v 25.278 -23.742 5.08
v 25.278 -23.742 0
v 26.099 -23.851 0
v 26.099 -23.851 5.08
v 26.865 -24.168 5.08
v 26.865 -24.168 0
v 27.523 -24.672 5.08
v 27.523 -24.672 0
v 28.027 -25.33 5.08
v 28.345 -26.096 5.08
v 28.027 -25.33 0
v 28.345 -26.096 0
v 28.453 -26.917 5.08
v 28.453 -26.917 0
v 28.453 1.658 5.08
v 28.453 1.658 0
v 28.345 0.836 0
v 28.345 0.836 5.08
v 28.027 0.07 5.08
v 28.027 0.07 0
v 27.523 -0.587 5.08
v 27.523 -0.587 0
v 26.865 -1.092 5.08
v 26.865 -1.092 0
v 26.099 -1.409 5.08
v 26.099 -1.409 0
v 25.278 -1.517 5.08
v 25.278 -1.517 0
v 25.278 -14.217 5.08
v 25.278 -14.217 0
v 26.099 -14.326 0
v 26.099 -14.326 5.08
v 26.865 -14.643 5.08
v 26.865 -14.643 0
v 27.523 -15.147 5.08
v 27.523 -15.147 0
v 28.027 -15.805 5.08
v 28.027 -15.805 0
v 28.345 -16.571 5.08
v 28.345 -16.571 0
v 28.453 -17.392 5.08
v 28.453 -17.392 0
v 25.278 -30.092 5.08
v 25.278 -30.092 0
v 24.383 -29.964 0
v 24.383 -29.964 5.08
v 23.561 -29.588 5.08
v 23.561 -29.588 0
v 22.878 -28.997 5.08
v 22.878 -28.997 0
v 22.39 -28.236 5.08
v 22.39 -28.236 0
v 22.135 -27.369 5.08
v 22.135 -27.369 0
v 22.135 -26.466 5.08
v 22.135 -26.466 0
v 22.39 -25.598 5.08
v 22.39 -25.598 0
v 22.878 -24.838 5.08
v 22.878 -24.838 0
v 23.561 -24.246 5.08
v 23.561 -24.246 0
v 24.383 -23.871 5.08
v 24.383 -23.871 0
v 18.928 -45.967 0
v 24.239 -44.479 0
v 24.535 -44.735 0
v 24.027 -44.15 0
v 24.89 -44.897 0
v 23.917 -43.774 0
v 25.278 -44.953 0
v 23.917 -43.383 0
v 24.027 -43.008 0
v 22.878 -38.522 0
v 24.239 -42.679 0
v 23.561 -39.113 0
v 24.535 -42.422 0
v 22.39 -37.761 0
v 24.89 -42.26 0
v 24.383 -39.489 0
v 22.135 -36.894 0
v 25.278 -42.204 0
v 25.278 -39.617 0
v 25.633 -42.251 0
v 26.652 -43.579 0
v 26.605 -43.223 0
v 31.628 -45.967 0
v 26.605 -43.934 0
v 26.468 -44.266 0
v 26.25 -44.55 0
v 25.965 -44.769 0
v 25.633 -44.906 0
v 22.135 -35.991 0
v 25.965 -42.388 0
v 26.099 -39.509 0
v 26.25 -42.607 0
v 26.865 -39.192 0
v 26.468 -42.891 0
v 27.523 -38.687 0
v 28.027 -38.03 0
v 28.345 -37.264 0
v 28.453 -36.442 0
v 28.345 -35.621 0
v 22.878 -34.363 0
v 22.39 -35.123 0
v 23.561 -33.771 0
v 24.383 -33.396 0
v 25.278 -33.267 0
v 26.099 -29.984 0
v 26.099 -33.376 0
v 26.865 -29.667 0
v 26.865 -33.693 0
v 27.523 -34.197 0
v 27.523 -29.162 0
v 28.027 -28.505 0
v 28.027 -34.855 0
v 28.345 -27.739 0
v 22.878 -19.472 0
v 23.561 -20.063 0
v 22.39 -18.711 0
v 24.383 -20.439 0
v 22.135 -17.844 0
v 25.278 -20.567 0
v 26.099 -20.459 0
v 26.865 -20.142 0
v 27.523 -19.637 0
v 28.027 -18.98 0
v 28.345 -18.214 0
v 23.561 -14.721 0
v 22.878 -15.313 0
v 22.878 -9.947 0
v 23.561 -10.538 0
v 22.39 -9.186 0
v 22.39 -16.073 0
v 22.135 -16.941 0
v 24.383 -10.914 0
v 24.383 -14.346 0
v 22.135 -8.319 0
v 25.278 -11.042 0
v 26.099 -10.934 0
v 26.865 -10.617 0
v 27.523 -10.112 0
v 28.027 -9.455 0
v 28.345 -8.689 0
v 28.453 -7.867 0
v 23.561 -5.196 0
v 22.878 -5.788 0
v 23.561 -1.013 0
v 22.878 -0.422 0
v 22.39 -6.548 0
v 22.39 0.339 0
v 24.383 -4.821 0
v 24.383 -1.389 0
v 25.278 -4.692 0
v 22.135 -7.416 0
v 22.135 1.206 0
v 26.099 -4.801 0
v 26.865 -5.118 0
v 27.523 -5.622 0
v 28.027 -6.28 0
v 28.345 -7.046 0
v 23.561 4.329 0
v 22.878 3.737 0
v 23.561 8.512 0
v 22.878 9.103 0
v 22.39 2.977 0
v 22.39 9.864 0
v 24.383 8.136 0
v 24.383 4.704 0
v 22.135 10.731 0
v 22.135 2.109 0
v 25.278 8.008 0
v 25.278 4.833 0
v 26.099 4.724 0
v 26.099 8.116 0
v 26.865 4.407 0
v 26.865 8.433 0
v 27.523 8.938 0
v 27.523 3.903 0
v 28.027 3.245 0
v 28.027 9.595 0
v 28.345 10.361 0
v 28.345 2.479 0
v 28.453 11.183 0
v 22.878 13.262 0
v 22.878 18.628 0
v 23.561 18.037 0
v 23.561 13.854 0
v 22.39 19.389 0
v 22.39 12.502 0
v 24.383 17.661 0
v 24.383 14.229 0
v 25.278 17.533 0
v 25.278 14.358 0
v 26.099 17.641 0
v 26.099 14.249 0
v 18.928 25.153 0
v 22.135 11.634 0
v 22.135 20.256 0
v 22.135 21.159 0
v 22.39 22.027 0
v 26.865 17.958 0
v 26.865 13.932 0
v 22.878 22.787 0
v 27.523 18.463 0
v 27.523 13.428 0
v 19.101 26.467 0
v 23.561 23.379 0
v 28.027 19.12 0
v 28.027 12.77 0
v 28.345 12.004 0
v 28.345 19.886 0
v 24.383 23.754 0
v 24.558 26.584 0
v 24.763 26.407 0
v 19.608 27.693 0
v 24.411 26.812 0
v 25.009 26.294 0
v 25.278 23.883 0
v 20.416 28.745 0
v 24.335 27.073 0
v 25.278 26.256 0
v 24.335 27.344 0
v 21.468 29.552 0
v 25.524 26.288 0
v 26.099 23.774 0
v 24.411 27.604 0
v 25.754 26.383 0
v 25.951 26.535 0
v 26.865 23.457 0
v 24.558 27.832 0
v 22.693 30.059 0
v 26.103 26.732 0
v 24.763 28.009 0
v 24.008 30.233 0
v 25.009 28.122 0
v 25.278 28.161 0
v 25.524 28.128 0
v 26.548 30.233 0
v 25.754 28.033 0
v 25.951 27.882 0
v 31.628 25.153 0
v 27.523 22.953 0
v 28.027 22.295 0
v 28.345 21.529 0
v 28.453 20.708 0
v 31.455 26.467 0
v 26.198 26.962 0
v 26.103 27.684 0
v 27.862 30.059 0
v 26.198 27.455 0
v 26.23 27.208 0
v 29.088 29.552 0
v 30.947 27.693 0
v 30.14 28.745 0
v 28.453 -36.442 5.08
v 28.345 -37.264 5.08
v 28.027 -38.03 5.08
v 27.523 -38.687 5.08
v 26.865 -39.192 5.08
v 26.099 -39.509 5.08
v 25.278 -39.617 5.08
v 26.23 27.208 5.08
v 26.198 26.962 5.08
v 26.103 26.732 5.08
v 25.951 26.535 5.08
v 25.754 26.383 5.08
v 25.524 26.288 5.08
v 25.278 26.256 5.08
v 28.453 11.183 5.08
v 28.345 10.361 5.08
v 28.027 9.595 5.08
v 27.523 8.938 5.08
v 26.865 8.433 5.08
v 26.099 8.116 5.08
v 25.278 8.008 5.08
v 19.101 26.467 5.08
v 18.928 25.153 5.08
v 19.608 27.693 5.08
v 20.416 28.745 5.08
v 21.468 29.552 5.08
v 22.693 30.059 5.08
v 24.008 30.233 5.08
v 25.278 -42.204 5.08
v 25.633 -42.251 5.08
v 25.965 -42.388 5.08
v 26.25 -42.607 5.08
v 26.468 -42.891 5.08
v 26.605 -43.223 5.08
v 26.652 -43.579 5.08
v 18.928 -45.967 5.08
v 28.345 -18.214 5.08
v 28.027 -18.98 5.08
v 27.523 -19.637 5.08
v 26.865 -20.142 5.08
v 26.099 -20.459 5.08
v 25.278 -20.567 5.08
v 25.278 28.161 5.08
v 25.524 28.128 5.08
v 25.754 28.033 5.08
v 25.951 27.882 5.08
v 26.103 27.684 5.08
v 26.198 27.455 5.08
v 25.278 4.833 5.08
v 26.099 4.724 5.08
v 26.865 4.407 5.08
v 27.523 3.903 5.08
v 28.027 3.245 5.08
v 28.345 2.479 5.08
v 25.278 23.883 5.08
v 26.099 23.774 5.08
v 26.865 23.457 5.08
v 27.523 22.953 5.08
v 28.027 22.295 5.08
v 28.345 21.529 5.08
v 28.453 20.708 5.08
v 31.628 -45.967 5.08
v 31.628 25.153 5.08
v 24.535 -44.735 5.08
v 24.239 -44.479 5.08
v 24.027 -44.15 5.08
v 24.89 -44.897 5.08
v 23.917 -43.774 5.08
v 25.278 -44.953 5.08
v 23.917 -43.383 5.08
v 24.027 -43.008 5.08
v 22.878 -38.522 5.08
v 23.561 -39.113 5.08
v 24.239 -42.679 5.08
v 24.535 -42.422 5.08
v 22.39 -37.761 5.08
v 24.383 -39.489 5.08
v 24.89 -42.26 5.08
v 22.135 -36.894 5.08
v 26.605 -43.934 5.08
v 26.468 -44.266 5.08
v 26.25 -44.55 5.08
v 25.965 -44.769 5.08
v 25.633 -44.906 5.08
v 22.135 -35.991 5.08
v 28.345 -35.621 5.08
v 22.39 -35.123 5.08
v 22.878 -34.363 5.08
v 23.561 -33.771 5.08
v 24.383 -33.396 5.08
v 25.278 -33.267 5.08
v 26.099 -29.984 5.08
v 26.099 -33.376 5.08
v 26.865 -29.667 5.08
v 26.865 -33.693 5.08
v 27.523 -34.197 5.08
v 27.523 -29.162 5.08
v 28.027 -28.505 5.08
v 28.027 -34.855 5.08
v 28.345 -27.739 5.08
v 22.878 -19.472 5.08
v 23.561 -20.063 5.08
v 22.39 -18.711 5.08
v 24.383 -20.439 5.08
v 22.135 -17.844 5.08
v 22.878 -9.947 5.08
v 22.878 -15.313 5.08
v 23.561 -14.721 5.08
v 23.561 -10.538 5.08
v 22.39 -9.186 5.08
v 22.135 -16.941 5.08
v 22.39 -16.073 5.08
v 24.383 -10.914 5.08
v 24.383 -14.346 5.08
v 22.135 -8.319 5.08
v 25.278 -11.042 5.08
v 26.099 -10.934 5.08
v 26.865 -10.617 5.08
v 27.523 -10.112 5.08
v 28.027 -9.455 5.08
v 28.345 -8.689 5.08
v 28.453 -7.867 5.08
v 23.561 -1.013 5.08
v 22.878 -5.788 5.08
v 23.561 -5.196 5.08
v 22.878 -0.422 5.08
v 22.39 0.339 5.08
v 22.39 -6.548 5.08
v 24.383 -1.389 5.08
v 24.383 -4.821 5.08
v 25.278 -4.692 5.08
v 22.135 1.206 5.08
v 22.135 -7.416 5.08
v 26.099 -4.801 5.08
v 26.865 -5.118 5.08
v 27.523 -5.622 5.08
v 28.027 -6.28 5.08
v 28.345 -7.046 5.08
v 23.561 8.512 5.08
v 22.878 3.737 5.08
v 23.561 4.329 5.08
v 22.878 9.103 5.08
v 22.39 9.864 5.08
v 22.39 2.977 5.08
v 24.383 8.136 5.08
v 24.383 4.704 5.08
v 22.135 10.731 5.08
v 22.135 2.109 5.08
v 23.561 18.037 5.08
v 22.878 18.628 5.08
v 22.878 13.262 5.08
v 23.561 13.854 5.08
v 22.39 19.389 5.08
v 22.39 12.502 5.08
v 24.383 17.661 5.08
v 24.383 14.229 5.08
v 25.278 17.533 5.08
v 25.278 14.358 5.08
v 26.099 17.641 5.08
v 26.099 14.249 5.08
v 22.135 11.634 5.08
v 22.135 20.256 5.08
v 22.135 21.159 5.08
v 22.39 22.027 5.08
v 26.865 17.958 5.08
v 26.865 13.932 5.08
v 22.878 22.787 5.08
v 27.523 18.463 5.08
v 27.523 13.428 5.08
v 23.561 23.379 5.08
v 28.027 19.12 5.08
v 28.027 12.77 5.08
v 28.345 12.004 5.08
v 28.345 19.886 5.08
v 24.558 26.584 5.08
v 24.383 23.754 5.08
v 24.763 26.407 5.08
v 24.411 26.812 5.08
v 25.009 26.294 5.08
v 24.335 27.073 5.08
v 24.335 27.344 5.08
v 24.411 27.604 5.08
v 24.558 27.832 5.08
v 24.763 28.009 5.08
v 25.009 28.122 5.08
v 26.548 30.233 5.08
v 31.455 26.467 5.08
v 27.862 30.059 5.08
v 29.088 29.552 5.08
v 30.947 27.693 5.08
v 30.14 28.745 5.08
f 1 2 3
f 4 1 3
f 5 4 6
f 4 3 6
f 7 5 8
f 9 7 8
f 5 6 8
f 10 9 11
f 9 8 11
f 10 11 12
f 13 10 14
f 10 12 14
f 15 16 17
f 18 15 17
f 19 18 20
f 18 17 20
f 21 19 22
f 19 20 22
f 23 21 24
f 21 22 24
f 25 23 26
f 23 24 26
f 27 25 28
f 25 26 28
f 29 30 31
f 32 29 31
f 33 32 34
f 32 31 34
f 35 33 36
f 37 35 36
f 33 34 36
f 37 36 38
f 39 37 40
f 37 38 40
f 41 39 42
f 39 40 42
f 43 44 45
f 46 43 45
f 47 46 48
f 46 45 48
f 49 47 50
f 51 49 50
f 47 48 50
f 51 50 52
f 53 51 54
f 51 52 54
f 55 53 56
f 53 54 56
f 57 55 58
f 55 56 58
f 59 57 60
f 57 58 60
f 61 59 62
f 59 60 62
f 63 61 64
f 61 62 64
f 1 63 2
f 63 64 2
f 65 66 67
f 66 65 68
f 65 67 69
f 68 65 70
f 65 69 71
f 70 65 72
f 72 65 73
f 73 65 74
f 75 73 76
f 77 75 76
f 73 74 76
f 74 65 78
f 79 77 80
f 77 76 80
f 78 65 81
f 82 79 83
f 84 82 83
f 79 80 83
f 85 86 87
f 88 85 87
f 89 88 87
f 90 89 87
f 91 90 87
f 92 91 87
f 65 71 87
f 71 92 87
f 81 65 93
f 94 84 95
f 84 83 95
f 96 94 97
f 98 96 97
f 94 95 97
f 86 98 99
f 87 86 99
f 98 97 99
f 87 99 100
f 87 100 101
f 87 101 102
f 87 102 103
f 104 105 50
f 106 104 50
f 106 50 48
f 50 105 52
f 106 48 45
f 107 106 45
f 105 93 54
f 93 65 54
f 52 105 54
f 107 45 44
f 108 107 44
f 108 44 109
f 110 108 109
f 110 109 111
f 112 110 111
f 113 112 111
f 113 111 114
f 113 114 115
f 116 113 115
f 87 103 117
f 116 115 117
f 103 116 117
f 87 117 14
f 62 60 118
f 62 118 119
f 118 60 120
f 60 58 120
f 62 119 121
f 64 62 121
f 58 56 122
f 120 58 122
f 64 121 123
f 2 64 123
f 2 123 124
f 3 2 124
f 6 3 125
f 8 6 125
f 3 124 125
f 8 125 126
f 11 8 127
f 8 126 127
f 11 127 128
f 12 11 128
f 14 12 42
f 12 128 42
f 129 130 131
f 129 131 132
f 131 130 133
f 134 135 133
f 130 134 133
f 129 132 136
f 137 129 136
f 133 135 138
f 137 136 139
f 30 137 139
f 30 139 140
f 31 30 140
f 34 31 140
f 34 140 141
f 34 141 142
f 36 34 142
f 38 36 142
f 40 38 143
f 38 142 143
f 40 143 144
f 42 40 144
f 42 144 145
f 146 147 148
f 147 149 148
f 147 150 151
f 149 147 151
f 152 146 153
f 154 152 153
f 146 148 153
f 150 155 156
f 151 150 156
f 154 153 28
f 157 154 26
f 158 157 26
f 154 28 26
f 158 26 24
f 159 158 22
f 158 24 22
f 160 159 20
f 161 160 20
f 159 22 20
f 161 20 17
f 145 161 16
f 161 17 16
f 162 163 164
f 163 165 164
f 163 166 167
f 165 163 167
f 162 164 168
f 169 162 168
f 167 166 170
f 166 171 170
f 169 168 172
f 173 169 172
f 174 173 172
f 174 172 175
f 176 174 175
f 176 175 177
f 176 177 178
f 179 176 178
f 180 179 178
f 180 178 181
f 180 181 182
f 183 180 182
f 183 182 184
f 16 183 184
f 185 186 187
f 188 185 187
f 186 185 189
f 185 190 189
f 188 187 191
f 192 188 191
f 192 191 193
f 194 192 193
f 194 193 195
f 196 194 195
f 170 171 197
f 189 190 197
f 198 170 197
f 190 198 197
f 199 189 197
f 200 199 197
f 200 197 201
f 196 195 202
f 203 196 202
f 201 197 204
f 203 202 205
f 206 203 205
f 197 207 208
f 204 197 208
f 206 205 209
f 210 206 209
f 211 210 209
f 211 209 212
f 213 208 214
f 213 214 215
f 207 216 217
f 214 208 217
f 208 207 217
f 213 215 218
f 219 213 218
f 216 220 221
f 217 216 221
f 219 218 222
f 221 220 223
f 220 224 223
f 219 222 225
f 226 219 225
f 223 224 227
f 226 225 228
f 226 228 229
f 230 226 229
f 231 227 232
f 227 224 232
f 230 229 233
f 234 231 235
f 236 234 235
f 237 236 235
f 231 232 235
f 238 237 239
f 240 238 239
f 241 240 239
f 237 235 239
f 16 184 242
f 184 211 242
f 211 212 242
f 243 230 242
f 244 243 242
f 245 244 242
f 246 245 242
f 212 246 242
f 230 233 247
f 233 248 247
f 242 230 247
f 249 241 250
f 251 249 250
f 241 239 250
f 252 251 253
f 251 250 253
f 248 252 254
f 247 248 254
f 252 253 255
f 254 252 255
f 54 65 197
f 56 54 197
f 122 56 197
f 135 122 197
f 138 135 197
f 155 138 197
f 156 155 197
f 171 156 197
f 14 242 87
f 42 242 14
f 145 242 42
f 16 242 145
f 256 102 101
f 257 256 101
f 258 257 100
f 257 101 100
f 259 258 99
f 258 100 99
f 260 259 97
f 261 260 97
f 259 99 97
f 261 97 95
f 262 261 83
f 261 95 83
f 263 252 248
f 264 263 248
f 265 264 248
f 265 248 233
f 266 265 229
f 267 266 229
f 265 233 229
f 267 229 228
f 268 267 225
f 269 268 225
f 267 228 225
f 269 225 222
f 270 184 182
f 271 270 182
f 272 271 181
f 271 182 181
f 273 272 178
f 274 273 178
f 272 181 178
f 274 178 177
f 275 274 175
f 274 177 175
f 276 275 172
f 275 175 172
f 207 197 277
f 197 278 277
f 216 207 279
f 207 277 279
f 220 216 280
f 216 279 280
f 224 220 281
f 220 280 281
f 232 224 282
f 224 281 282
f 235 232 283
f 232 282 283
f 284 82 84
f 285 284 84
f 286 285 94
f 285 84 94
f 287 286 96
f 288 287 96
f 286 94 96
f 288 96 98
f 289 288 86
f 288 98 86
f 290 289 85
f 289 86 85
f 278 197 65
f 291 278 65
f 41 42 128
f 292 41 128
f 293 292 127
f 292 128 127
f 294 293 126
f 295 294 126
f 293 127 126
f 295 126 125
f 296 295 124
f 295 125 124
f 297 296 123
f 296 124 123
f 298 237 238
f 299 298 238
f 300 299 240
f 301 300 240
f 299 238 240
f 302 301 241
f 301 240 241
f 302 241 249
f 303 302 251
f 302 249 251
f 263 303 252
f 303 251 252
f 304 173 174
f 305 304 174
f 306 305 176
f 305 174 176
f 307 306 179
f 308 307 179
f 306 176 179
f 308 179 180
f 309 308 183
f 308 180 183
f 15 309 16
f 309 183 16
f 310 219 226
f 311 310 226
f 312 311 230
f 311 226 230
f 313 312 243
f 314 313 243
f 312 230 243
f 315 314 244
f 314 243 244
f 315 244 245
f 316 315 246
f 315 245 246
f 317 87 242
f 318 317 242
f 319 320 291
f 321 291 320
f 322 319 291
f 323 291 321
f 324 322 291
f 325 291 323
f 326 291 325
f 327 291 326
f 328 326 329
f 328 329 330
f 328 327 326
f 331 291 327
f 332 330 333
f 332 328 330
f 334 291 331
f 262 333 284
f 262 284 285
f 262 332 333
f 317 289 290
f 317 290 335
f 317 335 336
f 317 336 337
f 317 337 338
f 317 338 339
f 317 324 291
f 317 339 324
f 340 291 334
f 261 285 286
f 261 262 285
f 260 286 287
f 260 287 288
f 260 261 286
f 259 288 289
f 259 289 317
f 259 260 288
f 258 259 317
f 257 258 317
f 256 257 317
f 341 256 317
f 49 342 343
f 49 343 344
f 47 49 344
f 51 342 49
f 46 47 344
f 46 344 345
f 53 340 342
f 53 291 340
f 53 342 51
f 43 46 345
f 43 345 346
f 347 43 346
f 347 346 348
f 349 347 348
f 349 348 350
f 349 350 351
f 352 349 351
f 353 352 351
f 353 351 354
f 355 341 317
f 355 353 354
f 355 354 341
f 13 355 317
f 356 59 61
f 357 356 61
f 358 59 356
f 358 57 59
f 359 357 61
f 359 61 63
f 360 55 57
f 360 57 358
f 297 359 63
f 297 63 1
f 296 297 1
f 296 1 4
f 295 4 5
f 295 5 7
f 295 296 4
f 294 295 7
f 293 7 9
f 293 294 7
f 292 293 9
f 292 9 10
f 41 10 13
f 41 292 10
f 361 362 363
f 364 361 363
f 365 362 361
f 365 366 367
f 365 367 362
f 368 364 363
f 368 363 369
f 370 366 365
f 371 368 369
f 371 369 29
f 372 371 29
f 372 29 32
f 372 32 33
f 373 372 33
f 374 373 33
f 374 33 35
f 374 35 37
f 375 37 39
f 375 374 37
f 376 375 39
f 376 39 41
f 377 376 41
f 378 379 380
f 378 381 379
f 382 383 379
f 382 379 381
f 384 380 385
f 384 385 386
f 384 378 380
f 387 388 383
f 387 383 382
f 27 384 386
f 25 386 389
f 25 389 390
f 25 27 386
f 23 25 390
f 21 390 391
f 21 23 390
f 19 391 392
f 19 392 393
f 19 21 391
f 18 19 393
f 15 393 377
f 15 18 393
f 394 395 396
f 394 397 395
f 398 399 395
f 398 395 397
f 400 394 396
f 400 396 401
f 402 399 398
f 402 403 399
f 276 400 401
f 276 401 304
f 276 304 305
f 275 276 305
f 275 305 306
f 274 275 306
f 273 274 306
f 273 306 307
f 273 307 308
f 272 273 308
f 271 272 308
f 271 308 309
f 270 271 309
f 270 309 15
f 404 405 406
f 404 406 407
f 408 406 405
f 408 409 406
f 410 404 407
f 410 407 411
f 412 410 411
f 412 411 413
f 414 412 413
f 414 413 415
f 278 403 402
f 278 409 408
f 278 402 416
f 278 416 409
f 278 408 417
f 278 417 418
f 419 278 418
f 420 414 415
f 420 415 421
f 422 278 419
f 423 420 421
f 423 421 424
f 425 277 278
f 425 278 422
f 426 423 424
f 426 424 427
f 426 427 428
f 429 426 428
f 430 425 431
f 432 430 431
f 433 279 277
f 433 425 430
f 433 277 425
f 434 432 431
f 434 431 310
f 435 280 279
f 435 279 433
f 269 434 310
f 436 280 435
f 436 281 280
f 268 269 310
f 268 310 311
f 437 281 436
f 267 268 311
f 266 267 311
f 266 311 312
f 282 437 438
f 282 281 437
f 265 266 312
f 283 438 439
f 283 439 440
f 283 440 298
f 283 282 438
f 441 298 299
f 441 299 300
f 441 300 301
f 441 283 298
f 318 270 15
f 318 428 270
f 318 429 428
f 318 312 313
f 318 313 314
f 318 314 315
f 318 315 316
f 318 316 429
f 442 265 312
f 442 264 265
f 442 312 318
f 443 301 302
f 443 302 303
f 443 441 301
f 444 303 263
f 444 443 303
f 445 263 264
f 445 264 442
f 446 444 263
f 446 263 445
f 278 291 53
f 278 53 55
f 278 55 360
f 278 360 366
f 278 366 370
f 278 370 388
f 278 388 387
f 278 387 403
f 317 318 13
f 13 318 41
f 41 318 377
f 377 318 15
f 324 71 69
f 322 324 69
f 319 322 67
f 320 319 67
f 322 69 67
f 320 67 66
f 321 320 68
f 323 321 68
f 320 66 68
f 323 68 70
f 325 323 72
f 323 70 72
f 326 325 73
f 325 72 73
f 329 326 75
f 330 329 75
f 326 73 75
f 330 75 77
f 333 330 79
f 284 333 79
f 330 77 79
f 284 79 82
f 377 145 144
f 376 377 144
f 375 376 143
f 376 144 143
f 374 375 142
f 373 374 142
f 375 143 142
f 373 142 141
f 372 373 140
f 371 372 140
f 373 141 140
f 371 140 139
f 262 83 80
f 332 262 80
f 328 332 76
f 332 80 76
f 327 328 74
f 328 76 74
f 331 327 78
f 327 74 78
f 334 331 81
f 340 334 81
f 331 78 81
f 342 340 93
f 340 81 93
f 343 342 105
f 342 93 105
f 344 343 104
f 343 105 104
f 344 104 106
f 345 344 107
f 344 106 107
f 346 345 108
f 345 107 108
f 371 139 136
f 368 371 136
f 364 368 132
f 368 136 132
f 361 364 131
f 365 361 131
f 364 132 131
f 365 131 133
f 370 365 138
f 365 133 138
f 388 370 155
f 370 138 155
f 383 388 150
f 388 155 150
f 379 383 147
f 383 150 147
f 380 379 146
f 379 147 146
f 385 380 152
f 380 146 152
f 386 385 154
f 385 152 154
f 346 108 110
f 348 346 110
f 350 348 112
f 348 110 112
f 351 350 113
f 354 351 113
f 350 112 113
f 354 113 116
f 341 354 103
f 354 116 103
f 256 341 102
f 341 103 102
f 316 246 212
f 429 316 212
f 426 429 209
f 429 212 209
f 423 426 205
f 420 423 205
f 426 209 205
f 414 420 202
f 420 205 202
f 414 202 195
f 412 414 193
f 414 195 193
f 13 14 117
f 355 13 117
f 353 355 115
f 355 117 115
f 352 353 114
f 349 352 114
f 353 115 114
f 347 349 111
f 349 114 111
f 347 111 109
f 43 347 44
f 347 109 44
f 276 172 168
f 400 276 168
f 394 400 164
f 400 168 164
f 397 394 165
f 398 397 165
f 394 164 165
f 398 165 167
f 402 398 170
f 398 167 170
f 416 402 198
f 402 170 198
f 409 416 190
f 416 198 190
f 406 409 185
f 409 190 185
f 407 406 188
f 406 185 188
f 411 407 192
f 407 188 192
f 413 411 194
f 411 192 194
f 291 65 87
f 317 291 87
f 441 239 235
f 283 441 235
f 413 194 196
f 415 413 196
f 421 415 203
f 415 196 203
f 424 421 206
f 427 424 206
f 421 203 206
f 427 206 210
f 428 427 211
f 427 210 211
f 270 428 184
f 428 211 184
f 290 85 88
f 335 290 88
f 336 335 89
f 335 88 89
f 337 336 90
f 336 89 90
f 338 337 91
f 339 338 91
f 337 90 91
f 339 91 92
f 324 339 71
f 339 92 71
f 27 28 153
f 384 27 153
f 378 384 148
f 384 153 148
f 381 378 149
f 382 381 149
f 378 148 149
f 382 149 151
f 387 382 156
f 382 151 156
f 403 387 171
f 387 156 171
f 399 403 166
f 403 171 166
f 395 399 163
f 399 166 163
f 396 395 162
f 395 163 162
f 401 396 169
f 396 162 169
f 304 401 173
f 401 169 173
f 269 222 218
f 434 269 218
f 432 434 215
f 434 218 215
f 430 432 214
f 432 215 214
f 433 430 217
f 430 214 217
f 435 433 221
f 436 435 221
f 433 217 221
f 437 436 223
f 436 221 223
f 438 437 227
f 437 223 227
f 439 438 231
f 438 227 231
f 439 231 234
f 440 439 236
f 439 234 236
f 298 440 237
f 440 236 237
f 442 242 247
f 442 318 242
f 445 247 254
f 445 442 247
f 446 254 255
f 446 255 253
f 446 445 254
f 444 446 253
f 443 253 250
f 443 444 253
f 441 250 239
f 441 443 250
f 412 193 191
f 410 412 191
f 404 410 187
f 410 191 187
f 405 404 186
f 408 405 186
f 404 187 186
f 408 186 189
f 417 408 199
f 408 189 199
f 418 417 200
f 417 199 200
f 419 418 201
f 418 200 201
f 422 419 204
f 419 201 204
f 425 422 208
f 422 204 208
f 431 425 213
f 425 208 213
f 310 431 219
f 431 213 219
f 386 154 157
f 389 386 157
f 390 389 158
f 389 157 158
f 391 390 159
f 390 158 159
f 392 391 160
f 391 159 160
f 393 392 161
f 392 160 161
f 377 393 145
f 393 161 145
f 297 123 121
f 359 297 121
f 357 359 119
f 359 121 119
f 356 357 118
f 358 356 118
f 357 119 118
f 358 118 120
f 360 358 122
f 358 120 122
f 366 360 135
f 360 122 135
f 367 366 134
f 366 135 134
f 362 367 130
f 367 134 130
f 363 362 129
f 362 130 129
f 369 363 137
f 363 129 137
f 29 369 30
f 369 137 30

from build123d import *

# Parameters (mm, degrees)
F1_DEPTH = 5.08
F2_R     = 5.08


with BuildPart() as f1:
    # F0 (on Top) → F1 (new body)
    with BuildSketch(Plane.XY):
        with BuildLine():
            Line((25.277688, 30.232569), (18.927688, 30.232569))
            Line((18.927688, 30.232569), (18.927688, -45.967431))
            Line((18.927688, -45.967431), (25.277688, -45.967431))
            Line((25.277688, -45.967431), (25.277688, -44.953016))
            ThreePointArc((25.277688, -44.953016), (23.903282, -43.57861), (25.277688, -42.204203))
            Line((25.277688, -42.204203), (25.277688, -39.617431))
            ThreePointArc((25.277688, -39.617431), (22.102688, -36.442431), (25.277688, -33.267431))
            Line((25.277688, -33.267431), (25.277688, -30.092431))
            ThreePointArc((25.277688, -30.092431), (22.102688, -26.917431), (25.277688, -23.742431))
            Line((25.277688, -23.742431), (25.277688, -20.567431))
            ThreePointArc((25.277688, -20.567431), (22.102688, -17.392431), (25.277688, -14.217431))
            Line((25.277688, -14.217431), (25.277688, -11.042431))
            ThreePointArc((25.277688, -11.042431), (22.102688, -7.867431), (25.277688, -4.692431))
            Line((25.277688, -4.692431), (25.277688, -1.517431))
            ThreePointArc((25.277688, -1.517431), (22.102688, 1.657569), (25.277688, 4.832569))
            Line((25.277688, 4.832569), (25.277688, 8.007569))
            ThreePointArc((25.277688, 8.007569), (22.102688, 11.182569), (25.277688, 14.357569))
            Line((25.277688, 14.357569), (25.277688, 17.532569))
            ThreePointArc((25.277688, 17.532569), (22.102688, 20.707569), (25.277688, 23.882569))
            Line((25.277688, 23.882569), (25.277688, 26.255571))
            ThreePointArc((25.277688, 26.255571), (24.325188, 27.208071), (25.277688, 28.160571))
            Line((25.277688, 28.160571), (25.277688, 30.232569))
        make_face()
        with BuildLine():
            Line((31.627688, 30.232569), (25.277688, 30.232569))
            Line((25.277688, 30.232569), (25.277688, 28.160571))
            ThreePointArc((25.277688, 28.160571), (25.951207, 27.88159), (26.230188, 27.208071))
            ThreePointArc((26.230188, 27.208071), (25.951207, 26.534552), (25.277688, 26.255571))
            Line((25.277688, 26.255571), (25.277688, 23.882569))
            ThreePointArc((25.277688, 23.882569), (27.522752, 22.952633), (28.452688, 20.707569))
            ThreePointArc((28.452688, 20.707569), (27.522752, 18.462505), (25.277688, 17.532569))
            Line((25.277688, 17.532569), (25.277688, 14.357569))
            ThreePointArc((25.277688, 14.357569), (27.522752, 13.427633), (28.452688, 11.182569))
            ThreePointArc((28.452688, 11.182569), (27.522752, 8.937505), (25.277688, 8.007569))
            Line((25.277688, 8.007569), (25.277688, 4.832569))
            ThreePointArc((25.277688, 4.832569), (27.522752, 3.902633), (28.452688, 1.657569))
            ThreePointArc((28.452688, 1.657569), (27.522752, -0.587495), (25.277688, -1.517431))
            Line((25.277688, -1.517431), (25.277688, -4.692431))
            ThreePointArc((25.277688, -4.692431), (27.522752, -5.622367), (28.452688, -7.867431))
            ThreePointArc((28.452688, -7.867431), (27.522752, -10.112495), (25.277688, -11.042431))
            Line((25.277688, -11.042431), (25.277688, -14.217431))
            ThreePointArc((25.277688, -14.217431), (27.522752, -15.147367), (28.452688, -17.392431))
            ThreePointArc((28.452688, -17.392431), (27.522752, -19.637495), (25.277688, -20.567431))
            Line((25.277688, -20.567431), (25.277688, -23.742431))
            ThreePointArc((25.277688, -23.742431), (27.522752, -24.672367), (28.452688, -26.917431))
            ThreePointArc((28.452688, -26.917431), (27.522752, -29.162495), (25.277688, -30.092431))
            Line((25.277688, -30.092431), (25.277688, -33.267431))
            ThreePointArc((25.277688, -33.267431), (27.522752, -34.197367), (28.452688, -36.442431))
            ThreePointArc((28.452688, -36.442431), (27.522752, -38.687495), (25.277688, -39.617431))
            Line((25.277688, -39.617431), (25.277688, -42.204203))
            ThreePointArc((25.277688, -42.204203), (26.24954, -42.606758), (26.652095, -43.57861))
            ThreePointArc((26.652095, -43.57861), (26.24954, -44.550462), (25.277688, -44.953016))
            Line((25.277688, -44.953016), (25.277688, -45.967431))
            Line((25.277688, -45.967431), (31.627688, -45.967431))
            Line((31.627688, -45.967431), (31.627688, 30.232569))
        make_face()
    extrude(amount=F1_DEPTH)

    # F2
    f2_edges = [f1.edges().sort_by_distance(p)[0] for p in [
        (31.627688, 30.232569, 2.54),
        (18.927688, 30.232569, 2.54),
    ]]
    fillet(f2_edges, radius=F2_R)


solid = f1.part
